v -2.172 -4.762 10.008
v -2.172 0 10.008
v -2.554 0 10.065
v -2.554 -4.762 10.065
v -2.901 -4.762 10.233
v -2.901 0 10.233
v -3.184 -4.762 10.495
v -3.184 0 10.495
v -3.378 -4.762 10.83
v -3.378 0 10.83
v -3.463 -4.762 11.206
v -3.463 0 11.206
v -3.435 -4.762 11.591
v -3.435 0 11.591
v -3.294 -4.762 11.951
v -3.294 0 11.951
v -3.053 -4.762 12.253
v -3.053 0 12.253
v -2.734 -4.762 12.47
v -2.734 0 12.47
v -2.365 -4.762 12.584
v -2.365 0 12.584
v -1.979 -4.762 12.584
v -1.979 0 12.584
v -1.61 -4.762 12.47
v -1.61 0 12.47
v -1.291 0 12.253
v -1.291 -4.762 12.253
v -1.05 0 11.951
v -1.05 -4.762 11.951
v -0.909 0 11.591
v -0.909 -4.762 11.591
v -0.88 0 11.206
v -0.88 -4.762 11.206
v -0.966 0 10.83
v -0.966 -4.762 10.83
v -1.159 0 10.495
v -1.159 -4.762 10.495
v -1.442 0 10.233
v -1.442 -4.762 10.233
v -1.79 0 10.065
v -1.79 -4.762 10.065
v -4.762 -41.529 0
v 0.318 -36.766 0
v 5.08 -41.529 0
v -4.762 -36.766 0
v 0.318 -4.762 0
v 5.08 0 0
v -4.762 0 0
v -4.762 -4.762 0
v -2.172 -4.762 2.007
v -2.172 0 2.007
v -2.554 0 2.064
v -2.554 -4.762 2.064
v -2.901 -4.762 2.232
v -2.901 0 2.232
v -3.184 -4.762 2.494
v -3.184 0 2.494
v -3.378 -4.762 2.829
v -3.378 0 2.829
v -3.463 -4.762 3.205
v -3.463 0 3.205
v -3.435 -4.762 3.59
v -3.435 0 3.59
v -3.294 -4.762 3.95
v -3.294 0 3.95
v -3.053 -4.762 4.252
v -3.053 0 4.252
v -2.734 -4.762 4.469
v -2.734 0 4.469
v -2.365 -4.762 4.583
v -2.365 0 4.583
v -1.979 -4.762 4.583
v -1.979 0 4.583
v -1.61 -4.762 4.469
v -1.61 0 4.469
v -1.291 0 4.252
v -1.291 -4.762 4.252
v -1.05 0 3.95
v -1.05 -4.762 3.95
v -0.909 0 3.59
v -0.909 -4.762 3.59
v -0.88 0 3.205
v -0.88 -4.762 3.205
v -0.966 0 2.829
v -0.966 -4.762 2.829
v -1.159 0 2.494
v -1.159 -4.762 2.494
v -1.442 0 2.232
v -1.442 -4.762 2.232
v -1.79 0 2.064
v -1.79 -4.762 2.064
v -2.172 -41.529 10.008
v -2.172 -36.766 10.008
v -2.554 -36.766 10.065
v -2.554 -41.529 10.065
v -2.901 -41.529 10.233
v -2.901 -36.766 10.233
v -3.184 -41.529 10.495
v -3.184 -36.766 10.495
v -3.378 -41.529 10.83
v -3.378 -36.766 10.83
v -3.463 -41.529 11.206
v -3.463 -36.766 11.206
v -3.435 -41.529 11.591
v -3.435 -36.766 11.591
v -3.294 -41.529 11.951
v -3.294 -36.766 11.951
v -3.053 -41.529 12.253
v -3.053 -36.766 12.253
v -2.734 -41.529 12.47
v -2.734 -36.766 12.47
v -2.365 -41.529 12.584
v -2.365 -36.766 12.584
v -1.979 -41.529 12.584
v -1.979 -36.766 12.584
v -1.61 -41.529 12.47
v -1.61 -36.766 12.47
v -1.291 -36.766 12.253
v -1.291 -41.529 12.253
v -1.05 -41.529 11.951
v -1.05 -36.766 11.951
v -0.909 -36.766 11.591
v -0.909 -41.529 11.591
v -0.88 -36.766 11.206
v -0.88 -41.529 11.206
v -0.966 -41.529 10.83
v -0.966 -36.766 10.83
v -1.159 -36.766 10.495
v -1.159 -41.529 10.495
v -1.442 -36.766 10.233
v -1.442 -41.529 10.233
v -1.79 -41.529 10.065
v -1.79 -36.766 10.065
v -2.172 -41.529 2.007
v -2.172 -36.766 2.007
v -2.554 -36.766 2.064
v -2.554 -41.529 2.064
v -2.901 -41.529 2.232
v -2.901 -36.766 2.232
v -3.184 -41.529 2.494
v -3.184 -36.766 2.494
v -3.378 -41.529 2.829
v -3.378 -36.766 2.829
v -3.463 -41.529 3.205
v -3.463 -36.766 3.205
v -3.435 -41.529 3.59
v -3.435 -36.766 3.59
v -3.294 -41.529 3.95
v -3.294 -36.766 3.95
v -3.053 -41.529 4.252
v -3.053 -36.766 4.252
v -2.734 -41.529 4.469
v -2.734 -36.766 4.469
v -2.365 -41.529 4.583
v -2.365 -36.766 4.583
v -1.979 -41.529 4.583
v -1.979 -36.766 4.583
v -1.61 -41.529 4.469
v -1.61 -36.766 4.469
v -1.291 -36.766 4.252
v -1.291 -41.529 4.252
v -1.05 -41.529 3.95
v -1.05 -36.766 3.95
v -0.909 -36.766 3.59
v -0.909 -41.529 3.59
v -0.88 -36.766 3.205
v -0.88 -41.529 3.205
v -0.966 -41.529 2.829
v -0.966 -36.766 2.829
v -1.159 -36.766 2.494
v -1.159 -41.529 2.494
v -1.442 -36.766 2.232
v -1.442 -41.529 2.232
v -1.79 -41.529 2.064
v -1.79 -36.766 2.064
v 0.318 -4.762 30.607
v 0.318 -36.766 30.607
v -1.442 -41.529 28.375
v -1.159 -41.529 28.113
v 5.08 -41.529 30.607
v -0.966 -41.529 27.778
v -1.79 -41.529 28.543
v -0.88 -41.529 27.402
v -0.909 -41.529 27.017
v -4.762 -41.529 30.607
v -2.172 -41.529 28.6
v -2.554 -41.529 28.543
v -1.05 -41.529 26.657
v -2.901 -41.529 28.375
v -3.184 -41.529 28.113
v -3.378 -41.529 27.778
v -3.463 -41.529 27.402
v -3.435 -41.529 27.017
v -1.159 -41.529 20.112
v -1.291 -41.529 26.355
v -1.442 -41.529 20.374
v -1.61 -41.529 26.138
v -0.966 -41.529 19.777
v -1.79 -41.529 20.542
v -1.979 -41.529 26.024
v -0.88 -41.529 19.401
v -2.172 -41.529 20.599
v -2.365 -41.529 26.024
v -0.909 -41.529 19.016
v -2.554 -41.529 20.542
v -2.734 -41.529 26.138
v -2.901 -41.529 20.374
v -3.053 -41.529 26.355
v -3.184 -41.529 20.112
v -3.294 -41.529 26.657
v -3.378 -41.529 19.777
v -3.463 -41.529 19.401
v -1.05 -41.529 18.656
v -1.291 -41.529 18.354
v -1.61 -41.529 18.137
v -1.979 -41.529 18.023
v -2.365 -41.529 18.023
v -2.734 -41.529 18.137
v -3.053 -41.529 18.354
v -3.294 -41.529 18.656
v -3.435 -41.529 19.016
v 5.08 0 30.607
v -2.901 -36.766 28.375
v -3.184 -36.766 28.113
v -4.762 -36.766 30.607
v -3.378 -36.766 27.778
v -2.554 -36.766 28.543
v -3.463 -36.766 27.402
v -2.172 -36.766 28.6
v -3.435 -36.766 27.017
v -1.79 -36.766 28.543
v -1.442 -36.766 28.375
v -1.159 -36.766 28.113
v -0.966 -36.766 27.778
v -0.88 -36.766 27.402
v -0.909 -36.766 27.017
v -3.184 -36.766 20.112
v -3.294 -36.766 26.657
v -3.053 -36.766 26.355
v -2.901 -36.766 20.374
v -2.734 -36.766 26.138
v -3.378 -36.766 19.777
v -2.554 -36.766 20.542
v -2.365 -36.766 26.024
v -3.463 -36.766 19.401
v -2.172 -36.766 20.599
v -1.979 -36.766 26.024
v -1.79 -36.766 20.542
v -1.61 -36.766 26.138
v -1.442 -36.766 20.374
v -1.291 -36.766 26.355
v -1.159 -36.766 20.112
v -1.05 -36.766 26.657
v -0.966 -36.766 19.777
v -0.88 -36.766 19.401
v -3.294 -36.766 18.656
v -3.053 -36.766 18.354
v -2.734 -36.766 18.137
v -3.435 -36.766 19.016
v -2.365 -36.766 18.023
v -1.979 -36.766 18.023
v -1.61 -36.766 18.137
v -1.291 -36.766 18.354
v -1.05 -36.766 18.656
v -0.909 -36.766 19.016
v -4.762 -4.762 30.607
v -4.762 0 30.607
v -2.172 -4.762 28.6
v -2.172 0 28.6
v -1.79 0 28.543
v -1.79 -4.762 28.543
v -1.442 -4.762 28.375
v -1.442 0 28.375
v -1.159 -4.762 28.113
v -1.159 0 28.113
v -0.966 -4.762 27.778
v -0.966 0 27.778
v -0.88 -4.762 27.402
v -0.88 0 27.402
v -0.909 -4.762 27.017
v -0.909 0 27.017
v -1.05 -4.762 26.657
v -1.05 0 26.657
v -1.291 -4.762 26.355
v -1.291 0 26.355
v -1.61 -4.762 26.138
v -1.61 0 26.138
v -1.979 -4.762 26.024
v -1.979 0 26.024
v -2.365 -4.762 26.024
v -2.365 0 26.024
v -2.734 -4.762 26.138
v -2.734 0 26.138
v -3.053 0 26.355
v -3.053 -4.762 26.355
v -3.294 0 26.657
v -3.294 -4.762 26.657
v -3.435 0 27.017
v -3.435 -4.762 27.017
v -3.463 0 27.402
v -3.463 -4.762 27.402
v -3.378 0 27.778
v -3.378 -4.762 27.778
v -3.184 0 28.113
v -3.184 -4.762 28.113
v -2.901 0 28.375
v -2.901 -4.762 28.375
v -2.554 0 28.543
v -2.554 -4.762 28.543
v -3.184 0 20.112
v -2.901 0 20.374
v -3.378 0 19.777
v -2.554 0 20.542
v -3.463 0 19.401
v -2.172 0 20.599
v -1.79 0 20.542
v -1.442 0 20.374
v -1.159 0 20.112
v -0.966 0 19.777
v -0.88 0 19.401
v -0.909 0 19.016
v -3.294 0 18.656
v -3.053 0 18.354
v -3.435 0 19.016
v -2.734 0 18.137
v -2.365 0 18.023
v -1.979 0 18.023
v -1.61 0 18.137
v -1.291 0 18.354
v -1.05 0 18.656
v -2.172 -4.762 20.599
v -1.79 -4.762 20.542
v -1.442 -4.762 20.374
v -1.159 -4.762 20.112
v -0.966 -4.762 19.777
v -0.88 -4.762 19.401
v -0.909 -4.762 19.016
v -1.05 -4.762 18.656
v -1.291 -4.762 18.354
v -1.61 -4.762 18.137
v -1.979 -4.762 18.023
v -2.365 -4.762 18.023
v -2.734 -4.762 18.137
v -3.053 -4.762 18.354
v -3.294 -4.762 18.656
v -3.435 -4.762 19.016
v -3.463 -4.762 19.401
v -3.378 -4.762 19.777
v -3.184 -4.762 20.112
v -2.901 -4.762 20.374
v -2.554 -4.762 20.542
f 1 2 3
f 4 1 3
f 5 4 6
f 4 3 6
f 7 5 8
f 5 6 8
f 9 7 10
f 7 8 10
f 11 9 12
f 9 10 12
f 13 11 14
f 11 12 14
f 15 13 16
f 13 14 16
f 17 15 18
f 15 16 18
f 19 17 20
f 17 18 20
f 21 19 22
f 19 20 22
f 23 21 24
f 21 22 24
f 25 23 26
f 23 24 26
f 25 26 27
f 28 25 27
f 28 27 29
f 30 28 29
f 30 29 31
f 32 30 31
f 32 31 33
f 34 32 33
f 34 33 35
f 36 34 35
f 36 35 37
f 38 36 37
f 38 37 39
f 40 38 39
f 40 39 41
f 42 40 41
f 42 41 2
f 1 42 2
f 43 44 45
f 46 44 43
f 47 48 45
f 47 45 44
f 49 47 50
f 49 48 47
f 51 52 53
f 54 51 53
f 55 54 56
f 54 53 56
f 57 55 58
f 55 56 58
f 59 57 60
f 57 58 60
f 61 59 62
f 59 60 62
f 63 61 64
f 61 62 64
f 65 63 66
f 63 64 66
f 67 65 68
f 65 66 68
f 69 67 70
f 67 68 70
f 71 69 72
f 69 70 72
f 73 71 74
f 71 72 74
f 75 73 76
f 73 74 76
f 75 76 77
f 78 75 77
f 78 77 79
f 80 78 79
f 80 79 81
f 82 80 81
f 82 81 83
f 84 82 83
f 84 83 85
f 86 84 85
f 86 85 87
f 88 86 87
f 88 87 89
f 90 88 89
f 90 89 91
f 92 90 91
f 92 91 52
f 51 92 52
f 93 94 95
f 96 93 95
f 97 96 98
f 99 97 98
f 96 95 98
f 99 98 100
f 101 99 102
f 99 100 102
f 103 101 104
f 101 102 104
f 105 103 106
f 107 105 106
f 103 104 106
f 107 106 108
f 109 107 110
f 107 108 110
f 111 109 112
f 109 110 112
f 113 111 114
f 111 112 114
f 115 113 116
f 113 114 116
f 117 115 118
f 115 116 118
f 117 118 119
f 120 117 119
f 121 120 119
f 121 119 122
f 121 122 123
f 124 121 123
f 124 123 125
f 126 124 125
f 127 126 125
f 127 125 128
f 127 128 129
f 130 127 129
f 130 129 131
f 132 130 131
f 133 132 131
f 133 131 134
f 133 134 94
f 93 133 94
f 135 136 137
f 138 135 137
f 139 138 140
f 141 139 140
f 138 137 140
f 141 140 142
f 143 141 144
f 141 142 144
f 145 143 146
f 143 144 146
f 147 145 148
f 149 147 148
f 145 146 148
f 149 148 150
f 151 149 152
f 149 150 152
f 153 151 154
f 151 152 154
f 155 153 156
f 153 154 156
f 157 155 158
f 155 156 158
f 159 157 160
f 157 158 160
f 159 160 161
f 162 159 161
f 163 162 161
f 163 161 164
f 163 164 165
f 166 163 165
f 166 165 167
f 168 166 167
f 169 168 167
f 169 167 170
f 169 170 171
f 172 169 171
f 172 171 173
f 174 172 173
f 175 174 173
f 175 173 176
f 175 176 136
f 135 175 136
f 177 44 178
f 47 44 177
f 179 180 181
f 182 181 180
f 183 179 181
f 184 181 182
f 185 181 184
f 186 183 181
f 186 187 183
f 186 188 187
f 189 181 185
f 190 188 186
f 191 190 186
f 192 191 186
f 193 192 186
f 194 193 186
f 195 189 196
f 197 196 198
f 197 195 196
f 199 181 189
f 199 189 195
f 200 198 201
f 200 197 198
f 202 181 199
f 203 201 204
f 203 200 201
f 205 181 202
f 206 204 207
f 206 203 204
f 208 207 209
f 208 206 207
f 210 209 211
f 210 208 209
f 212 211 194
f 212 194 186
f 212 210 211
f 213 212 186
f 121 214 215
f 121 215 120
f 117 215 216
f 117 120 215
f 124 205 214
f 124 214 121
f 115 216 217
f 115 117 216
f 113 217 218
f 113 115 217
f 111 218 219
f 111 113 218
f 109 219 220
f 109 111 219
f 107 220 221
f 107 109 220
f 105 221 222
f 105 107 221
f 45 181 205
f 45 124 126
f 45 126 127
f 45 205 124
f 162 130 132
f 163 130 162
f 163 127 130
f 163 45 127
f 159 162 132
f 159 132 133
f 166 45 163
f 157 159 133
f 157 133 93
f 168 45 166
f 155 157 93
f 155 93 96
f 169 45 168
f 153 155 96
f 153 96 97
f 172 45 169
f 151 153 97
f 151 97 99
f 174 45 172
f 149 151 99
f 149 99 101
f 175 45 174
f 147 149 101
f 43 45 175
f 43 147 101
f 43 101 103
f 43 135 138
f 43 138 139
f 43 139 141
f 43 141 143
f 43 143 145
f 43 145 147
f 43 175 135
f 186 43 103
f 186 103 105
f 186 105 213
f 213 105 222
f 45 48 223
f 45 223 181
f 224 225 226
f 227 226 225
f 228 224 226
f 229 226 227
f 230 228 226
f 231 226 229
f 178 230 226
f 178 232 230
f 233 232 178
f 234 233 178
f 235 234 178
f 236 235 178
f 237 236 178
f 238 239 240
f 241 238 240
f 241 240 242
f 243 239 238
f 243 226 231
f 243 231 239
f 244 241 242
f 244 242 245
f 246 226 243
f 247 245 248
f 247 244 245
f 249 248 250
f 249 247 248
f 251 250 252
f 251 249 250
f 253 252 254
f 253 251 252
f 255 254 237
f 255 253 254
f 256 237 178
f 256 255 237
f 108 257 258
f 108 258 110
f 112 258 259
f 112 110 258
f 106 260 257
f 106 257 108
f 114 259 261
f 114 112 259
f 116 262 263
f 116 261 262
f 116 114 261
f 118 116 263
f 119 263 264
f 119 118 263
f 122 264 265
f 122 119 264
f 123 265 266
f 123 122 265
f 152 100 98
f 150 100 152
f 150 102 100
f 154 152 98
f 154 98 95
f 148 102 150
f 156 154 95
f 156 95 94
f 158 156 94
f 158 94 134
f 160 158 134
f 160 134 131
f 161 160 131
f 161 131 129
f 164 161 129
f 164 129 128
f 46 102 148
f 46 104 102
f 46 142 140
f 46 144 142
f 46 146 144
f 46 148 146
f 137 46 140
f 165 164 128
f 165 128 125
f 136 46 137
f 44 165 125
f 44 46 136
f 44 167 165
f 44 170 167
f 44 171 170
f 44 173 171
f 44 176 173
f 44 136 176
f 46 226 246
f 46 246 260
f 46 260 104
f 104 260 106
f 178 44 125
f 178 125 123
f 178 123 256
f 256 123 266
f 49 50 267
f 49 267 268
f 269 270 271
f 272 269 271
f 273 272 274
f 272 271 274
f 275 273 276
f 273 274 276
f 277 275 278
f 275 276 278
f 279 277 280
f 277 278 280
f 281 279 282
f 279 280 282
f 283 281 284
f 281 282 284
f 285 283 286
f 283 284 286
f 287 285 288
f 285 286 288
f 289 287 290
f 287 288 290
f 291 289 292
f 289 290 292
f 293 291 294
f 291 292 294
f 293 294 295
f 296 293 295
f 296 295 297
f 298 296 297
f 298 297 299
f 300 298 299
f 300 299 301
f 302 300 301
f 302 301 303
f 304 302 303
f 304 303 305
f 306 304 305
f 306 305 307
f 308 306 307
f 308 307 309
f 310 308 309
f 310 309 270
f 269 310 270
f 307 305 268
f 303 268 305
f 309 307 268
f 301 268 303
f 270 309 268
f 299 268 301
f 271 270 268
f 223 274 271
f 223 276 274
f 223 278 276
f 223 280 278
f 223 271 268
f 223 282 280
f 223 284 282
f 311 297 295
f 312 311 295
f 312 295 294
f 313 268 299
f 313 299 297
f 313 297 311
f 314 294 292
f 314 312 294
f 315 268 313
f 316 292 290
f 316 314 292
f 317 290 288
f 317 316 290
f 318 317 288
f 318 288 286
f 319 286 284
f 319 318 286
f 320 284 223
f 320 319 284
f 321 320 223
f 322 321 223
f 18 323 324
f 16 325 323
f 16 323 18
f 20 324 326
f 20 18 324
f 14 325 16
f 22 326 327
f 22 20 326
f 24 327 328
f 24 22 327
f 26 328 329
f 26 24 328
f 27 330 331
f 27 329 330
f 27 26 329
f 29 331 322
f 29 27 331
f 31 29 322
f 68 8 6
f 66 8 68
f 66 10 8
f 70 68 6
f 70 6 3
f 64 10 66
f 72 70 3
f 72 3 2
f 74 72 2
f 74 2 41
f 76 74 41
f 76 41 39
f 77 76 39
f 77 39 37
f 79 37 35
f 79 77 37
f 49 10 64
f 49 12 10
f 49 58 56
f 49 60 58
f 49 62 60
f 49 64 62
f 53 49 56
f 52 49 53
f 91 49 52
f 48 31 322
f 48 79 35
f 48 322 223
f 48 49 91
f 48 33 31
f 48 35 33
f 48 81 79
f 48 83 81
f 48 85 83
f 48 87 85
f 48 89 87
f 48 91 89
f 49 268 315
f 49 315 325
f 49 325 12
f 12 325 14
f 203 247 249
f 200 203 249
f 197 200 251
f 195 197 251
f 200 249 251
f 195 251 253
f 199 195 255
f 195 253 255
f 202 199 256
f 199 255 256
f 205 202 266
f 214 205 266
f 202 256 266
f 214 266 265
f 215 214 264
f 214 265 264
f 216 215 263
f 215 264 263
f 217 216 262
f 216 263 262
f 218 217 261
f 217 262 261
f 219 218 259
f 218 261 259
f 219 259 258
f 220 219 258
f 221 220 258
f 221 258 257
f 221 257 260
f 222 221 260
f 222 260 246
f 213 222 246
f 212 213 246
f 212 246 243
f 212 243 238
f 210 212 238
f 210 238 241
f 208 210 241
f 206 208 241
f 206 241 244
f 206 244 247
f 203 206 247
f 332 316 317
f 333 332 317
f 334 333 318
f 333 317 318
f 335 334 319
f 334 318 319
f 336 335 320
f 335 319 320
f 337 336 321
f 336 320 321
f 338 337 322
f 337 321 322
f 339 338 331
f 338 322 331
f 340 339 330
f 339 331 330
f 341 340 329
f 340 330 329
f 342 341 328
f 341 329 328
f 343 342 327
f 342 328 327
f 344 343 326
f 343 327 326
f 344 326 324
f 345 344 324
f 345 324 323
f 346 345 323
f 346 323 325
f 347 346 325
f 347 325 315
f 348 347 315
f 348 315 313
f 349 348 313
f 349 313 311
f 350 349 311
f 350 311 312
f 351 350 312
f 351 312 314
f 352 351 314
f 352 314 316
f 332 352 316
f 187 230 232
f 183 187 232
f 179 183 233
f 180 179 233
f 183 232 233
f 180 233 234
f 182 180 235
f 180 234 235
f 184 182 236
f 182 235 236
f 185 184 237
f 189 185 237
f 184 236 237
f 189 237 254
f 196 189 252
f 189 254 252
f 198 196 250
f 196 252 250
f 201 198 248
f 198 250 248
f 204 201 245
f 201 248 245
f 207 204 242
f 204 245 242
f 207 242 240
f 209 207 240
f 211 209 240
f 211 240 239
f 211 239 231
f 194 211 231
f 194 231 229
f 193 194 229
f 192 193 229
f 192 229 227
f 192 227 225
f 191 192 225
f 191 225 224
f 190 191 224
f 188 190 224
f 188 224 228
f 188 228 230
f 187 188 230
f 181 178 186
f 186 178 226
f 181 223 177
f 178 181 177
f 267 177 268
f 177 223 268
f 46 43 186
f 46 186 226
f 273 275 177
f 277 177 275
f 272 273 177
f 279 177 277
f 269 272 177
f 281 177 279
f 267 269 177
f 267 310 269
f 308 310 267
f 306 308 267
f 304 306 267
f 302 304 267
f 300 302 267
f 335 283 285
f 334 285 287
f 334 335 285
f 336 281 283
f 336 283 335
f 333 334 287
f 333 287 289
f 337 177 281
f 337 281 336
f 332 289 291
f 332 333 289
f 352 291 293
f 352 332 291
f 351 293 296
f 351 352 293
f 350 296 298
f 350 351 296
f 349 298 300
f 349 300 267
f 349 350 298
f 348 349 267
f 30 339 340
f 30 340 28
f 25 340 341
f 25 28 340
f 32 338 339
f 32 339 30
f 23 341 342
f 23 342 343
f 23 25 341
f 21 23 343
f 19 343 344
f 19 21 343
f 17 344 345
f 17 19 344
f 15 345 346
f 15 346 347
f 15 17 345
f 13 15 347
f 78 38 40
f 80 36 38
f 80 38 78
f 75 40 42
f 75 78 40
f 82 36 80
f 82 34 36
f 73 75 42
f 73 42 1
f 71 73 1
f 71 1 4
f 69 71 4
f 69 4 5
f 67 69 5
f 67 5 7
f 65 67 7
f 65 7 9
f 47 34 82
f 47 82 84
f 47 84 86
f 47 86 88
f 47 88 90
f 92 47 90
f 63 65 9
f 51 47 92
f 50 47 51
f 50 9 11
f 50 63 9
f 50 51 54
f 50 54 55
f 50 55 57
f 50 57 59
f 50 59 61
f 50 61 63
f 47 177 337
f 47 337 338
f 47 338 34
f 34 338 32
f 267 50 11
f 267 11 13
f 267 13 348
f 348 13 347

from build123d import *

# Parameters (mm, degrees)
BOSS_EXTRUDE1_DEPTH = 30.607
SKETCH2_R           = 1.2954
CUT_EXTRUDE1_DEPTH  = 52.838718059


with BuildPart() as part:
    # Sketch1 → Boss-Extrude1 (new body)
    with BuildSketch(Plane.XY):
        Polygon((-4.7625, 0), (5.08, 0), (5.08, -41.529), (-4.7625, -41.529), (-4.7625, -36.7665), (0.3175, -36.7665), (0.3175, -4.7625), (-4.7625, -4.7625), align=None)
    extrude(amount=BOSS_EXTRUDE1_DEPTH)

    # Sketch2 → Cut-Extrude1 (cut, through all)
    with BuildSketch(Plane(origin=(0, 0, 0), x_dir=(1, 0, 0), z_dir=(0, 1, 0))):
        with Locations(Location((-2.1717, -27.305, 0), (0, 0, 270))):
            Circle(SKETCH2_R)
        with Locations(Location((-2.1717, -19.304, 0), (0, 0, 270))):
            Circle(SKETCH2_R)
        with Locations(Location((-2.1717, -3.302, 0), (0, 0, 90))):
            Circle(SKETCH2_R)
        with Locations(Location((-2.1717, -11.303, 0), (0, 0, 90))):
            Circle(SKETCH2_R)
    extrude(amount=-CUT_EXTRUDE1_DEPTH, mode=Mode.SUBTRACT)


solid = part.part
